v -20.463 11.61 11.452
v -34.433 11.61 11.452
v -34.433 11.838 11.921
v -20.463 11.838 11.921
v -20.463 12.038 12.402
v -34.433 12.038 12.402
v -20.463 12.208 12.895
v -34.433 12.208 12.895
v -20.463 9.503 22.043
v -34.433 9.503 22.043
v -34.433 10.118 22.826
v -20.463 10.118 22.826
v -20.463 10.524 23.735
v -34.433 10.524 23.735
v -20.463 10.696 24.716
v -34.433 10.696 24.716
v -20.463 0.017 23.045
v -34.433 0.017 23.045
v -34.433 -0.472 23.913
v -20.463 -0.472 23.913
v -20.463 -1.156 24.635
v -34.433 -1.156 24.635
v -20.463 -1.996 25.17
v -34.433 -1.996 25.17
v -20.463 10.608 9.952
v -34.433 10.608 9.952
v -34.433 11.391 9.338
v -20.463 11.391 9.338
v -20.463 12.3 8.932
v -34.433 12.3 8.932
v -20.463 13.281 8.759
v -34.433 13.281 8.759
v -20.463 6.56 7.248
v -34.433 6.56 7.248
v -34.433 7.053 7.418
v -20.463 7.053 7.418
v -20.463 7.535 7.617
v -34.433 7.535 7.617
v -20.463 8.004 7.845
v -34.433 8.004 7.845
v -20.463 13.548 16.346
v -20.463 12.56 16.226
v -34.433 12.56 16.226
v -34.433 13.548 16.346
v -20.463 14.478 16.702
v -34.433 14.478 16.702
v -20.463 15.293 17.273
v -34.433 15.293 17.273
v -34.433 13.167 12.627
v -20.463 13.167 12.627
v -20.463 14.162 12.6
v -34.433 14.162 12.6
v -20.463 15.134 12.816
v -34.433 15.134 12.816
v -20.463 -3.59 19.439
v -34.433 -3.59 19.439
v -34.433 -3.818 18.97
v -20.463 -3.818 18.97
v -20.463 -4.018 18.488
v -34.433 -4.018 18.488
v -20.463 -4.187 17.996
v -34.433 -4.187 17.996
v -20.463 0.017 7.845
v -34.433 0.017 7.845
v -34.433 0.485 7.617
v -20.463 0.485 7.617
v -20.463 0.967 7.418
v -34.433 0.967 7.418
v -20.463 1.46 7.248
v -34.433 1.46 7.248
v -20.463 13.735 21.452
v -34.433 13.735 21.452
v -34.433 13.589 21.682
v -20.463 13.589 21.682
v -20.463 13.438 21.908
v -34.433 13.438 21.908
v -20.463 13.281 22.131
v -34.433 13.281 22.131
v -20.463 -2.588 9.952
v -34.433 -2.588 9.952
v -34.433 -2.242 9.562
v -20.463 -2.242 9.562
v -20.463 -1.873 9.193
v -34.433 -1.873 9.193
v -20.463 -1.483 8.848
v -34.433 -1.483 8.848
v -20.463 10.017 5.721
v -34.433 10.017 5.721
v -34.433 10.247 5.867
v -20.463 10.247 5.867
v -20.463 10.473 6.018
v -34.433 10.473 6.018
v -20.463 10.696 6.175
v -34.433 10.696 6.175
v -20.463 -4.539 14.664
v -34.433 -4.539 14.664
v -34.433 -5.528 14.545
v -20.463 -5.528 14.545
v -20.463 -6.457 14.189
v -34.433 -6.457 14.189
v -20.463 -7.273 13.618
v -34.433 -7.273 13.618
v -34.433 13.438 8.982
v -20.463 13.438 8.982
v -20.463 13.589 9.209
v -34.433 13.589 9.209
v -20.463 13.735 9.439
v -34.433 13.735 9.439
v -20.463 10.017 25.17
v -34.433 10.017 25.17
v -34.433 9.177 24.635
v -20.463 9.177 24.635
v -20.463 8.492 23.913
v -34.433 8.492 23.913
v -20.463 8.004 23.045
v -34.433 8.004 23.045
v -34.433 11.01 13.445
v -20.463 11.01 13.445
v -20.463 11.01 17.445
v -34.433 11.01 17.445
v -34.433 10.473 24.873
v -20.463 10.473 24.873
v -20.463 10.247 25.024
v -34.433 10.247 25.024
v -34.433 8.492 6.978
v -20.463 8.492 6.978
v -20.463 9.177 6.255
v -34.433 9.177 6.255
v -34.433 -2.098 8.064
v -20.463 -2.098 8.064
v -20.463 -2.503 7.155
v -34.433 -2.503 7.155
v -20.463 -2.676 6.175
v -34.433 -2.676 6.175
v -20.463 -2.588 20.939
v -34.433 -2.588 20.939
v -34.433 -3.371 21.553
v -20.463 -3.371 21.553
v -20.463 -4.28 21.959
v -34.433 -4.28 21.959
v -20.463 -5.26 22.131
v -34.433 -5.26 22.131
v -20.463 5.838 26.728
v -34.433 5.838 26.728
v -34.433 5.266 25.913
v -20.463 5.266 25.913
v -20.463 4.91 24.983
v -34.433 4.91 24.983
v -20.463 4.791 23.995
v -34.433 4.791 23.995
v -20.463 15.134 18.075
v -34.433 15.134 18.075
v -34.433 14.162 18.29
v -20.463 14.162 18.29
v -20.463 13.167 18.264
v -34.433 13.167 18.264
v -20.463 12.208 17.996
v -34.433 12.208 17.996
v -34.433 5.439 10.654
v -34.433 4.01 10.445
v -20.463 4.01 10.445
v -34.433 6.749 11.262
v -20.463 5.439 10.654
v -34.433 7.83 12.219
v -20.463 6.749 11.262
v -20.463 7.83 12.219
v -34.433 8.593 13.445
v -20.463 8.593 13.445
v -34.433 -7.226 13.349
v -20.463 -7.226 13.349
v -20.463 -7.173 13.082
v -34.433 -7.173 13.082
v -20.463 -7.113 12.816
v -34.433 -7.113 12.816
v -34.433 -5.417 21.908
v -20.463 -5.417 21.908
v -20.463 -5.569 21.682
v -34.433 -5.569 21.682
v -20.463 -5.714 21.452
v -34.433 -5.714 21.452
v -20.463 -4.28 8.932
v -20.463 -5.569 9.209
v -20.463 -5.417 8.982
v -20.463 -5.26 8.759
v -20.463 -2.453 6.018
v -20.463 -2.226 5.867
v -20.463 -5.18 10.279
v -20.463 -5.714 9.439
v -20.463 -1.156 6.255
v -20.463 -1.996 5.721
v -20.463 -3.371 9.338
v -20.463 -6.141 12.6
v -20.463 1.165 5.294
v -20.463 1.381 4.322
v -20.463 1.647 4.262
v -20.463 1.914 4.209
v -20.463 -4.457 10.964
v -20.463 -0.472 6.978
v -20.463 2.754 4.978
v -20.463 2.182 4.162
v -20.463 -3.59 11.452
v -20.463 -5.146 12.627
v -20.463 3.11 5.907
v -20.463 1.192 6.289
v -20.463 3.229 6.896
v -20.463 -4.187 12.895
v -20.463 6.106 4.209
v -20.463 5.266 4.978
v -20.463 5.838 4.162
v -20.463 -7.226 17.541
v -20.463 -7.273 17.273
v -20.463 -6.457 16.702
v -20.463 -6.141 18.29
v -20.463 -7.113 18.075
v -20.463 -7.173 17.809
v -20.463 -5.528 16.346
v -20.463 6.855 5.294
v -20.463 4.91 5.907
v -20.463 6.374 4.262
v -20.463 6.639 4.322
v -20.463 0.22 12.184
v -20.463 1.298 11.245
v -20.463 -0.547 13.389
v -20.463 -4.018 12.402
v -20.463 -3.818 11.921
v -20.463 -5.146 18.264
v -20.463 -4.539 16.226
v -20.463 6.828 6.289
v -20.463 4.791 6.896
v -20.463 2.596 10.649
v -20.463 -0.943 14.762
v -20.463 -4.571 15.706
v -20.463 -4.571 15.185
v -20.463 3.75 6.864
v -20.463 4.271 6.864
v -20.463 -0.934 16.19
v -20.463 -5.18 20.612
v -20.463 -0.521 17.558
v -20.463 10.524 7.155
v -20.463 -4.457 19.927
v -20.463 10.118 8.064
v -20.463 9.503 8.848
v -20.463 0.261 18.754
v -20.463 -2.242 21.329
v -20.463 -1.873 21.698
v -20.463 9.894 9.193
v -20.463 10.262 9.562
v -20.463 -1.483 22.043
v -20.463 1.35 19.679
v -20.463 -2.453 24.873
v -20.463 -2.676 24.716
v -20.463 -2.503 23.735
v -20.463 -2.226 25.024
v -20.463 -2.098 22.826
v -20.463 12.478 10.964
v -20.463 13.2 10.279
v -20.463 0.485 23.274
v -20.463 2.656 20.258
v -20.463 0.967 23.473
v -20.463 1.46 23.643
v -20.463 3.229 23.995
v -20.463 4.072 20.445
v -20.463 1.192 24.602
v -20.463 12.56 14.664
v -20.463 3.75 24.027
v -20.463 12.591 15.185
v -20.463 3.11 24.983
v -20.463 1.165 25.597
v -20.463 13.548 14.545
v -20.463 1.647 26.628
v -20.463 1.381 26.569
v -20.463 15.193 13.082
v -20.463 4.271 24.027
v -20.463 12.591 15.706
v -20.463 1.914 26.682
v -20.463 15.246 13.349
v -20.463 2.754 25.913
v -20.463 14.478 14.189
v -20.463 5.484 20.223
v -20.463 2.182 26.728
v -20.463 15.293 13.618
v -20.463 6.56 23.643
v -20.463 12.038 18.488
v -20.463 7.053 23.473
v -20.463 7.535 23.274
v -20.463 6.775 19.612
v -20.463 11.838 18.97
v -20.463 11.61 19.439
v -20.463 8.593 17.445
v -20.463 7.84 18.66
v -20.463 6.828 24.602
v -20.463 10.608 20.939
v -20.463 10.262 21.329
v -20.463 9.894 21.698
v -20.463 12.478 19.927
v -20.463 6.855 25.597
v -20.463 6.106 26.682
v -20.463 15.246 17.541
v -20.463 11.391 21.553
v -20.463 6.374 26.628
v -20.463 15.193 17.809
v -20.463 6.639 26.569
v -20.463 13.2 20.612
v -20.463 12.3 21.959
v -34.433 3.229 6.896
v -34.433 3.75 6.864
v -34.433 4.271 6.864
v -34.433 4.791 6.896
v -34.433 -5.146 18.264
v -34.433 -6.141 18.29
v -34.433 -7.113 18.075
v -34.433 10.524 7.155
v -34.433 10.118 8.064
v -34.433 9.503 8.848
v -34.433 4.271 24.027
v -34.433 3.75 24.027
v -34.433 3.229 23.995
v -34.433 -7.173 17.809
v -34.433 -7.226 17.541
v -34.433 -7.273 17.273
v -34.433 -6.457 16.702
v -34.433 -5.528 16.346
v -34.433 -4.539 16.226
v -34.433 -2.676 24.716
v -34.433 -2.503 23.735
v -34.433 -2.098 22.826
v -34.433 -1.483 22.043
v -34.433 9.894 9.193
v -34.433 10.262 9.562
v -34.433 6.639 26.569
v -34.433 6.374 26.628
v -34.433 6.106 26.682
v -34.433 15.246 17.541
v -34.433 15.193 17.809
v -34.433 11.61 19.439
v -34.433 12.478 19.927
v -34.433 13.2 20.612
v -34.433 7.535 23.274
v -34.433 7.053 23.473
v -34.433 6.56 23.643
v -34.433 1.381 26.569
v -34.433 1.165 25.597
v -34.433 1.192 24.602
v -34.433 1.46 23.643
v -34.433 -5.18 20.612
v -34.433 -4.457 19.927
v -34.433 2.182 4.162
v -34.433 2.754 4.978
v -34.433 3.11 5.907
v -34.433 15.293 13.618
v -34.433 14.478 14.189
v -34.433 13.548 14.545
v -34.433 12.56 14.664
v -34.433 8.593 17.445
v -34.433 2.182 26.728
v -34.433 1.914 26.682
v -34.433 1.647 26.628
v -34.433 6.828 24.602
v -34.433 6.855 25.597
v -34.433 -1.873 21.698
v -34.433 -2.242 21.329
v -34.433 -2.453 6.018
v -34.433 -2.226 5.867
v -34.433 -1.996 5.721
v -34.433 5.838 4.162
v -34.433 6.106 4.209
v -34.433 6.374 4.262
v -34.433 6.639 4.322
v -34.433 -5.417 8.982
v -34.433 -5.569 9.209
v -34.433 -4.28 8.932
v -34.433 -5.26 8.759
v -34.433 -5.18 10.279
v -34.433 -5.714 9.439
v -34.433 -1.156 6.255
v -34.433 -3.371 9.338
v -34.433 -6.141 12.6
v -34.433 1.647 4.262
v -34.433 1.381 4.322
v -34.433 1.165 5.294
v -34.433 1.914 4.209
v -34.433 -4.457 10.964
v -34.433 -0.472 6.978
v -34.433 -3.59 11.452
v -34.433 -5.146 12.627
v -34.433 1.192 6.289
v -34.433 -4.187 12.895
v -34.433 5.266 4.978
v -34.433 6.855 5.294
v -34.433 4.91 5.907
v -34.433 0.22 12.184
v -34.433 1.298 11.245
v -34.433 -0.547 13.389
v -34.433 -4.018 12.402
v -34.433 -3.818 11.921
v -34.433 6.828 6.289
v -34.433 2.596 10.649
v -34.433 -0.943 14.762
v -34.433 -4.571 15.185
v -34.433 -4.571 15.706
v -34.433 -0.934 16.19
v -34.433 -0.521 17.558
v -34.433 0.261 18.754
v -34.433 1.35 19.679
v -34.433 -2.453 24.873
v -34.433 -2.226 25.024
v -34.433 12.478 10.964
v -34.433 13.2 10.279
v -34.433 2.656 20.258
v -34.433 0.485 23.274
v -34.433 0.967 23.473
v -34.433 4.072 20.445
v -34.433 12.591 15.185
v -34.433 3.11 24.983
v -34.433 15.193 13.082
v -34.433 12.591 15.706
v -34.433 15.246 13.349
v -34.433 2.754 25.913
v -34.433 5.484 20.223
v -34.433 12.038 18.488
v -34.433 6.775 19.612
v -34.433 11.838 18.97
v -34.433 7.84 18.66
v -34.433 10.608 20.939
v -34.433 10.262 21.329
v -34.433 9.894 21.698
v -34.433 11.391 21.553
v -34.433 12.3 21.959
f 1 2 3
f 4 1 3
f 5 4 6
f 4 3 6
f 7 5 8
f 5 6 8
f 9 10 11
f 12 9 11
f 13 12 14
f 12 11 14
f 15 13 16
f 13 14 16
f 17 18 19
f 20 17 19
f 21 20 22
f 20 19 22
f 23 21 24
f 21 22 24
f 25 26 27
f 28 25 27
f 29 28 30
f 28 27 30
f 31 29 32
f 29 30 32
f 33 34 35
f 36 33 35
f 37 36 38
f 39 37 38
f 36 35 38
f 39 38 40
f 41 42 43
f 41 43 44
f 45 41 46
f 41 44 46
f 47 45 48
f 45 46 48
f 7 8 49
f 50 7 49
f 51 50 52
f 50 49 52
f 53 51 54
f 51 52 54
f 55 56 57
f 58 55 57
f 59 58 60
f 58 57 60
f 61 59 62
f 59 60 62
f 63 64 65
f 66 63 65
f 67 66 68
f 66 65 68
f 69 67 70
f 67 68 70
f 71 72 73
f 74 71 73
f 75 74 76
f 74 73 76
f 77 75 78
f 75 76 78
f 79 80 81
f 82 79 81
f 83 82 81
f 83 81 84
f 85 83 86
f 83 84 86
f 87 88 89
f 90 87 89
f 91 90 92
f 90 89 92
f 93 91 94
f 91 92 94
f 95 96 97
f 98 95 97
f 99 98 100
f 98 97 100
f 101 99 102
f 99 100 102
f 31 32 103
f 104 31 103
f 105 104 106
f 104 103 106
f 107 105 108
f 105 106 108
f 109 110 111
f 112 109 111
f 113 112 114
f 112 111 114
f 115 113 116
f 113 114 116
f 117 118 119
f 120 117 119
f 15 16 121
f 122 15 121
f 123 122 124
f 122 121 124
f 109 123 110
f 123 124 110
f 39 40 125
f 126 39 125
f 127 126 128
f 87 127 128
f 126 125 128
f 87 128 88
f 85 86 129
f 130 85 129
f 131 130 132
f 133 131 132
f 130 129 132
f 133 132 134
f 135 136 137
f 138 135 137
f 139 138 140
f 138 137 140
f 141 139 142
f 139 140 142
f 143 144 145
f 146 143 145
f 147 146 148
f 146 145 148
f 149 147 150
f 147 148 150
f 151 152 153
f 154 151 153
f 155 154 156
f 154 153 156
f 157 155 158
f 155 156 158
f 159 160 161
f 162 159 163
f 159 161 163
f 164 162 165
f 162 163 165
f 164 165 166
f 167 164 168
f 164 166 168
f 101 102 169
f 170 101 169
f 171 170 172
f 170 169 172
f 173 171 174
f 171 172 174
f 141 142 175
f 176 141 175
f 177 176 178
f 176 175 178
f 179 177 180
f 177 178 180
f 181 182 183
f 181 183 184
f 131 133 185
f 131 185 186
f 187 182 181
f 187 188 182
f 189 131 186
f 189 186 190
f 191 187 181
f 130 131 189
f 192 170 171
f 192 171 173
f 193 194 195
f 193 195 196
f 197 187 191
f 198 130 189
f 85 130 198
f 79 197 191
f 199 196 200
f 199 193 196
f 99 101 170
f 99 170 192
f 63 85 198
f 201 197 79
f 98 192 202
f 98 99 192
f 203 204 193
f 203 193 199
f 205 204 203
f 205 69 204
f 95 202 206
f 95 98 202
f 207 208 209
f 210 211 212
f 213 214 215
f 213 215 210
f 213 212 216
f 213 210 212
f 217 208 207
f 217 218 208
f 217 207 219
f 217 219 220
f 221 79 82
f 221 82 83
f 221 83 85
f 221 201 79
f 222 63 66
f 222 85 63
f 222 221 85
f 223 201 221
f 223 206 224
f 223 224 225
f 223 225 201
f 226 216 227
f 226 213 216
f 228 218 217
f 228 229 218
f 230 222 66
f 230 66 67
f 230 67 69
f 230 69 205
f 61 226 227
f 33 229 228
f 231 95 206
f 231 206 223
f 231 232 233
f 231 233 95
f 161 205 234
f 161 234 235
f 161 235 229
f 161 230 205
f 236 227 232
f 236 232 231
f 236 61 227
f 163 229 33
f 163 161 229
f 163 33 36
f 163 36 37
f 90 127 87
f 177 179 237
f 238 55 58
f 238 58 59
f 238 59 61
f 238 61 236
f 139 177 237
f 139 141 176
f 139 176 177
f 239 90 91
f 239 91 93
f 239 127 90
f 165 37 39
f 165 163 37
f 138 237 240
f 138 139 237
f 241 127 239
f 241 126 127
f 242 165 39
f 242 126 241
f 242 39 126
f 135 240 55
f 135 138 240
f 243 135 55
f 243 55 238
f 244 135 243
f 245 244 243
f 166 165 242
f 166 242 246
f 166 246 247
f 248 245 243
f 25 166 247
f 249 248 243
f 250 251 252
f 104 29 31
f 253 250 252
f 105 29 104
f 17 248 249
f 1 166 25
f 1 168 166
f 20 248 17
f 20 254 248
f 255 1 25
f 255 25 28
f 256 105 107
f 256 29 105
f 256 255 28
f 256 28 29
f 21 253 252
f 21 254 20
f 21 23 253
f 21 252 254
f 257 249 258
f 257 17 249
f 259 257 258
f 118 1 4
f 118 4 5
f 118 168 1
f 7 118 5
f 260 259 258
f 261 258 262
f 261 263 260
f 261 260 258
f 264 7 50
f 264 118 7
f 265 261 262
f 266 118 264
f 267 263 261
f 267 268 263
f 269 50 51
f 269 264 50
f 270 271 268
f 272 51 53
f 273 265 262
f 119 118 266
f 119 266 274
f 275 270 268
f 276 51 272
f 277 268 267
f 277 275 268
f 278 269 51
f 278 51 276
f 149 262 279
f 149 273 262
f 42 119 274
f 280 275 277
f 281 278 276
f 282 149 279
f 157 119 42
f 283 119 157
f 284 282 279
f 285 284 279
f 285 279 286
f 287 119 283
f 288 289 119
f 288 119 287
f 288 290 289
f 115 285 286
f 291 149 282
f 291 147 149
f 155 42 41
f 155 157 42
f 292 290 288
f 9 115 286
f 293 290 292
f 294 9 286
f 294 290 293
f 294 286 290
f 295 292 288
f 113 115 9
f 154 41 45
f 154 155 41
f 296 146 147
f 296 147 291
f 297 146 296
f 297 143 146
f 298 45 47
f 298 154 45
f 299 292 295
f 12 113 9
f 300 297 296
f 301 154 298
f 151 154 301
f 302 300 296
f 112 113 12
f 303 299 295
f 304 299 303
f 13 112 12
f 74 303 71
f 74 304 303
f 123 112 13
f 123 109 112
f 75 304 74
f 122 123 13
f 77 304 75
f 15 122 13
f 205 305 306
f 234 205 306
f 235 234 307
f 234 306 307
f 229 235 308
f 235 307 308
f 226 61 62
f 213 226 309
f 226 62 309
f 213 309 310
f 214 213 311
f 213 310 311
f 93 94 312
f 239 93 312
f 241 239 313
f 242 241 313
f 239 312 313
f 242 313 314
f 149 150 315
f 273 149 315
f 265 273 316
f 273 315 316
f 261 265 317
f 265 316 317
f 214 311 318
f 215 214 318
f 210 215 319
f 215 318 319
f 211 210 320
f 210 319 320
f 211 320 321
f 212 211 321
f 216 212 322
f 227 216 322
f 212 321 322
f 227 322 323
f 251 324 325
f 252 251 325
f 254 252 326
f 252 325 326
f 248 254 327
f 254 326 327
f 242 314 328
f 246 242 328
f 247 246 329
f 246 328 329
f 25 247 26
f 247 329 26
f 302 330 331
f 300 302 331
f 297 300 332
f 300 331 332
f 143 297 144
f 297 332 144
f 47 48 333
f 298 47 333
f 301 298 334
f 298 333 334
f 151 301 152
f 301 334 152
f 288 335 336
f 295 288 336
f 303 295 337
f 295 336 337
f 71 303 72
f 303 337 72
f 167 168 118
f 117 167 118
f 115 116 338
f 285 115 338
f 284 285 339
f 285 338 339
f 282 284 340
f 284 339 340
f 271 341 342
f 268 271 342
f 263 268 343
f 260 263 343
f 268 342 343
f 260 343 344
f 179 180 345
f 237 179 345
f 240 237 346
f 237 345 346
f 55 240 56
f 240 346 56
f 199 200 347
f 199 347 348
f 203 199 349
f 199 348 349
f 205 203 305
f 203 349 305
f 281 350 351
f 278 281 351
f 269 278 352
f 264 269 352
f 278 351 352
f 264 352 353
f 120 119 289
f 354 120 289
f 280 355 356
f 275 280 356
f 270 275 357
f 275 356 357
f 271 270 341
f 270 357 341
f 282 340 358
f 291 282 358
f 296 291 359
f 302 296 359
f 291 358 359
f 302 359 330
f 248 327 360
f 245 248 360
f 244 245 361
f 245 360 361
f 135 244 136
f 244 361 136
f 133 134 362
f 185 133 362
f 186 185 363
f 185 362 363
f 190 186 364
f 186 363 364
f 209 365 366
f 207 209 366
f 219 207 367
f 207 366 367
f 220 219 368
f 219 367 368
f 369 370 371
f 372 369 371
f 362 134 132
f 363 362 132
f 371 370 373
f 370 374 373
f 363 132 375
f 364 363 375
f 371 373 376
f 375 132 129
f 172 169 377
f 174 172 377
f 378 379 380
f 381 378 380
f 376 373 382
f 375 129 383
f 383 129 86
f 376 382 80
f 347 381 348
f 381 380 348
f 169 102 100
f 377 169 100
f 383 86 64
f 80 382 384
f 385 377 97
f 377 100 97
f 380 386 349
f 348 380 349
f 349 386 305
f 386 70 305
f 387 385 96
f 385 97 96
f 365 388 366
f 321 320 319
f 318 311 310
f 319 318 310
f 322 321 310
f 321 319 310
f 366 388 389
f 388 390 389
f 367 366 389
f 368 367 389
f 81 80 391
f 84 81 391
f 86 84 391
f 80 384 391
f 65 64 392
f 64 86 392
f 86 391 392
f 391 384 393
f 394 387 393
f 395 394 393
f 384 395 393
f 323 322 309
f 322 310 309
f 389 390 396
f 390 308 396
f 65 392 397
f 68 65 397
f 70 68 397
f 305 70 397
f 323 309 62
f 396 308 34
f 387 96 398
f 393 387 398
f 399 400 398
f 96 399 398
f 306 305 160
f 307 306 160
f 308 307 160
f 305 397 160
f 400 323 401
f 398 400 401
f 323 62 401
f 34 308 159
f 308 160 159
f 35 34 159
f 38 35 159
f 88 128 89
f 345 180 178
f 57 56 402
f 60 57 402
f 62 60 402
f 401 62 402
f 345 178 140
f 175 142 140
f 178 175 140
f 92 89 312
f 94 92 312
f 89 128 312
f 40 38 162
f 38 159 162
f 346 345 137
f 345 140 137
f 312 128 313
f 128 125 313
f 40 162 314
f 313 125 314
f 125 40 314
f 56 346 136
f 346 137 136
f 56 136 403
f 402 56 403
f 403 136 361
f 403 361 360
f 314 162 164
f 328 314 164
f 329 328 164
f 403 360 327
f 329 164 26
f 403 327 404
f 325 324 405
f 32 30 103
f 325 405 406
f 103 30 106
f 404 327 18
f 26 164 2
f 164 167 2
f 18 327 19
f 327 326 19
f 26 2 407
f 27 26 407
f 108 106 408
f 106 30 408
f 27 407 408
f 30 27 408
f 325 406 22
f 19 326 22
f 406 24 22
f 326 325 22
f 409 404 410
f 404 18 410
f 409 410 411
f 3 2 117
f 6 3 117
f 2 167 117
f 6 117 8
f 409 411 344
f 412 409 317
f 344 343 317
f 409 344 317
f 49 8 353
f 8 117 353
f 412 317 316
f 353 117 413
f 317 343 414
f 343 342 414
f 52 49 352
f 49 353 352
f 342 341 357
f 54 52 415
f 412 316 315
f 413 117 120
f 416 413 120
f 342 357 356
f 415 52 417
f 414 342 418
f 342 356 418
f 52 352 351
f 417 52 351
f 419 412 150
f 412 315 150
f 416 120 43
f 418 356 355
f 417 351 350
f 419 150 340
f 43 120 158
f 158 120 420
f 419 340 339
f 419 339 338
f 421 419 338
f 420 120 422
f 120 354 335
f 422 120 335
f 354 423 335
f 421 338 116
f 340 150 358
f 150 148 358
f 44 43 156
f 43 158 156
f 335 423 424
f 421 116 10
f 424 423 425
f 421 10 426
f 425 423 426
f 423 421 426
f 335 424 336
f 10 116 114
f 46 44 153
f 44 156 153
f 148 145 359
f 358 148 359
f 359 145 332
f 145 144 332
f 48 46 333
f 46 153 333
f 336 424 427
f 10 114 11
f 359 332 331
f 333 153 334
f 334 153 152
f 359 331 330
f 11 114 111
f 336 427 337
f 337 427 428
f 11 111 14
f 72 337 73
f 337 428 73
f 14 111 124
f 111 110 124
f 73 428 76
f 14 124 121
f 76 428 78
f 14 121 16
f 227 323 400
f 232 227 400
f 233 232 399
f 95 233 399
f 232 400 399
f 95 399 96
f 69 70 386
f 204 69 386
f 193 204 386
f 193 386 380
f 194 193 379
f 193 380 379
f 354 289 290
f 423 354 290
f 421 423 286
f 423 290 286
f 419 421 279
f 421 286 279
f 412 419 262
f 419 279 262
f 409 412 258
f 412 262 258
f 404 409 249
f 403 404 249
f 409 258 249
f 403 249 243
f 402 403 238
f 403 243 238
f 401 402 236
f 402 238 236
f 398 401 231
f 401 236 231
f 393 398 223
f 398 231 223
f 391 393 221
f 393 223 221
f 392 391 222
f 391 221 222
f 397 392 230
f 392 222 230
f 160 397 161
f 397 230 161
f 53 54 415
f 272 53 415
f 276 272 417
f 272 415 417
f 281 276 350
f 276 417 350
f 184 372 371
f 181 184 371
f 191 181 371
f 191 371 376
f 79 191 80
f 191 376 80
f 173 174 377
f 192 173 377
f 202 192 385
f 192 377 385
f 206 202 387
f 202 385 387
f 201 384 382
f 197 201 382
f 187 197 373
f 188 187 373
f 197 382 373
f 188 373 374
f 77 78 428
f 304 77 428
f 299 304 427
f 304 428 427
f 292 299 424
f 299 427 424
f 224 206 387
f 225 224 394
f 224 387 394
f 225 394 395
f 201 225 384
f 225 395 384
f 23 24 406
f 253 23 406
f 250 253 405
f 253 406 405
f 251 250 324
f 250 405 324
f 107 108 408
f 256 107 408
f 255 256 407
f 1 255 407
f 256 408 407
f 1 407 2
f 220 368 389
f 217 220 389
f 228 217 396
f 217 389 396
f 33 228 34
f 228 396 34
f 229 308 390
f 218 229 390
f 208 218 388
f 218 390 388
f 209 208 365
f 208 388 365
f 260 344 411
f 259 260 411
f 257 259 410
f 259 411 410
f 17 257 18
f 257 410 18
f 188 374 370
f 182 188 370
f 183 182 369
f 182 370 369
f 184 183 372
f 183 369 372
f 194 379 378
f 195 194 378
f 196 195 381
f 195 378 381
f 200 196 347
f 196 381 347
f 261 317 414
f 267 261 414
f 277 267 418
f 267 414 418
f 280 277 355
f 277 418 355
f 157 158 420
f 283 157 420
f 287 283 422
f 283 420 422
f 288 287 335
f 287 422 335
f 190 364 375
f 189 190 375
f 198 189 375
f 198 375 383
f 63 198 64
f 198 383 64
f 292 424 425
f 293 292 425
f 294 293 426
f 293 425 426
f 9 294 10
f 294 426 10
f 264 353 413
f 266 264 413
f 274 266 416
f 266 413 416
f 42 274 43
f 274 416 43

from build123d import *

# Parameters (mm, degrees)
SPUR_START             = -34.432979129
SPUR_GEAR_AI_OUTLINE_R = 4.7625
SPUR_GEAR_AI_DEPTH     = 13.97
CUT_EXTRUDE1_DEPTH     = 34.814807958


# Read off the part's stored shape, not the designer's step: spur gear_ai
with BuildPart() as part:
    # spur gear_ai outline → spur gear_ai (new body)
    with BuildSketch(Plane.YZ.offset(SPUR_START)):
        with BuildLine():
            ThreePointArc((13.280785394, 8.759491053), (13.513878524, 9.095188342), (13.734821499, 9.439004105))
            ThreePointArc((13.734821499, 9.439004105), (12.859979854, 10.643431253), (11.610114863, 11.452028906))
            ThreePointArc((11.610114863, 11.452028906), (11.941871418, 12.159942302), (12.207854471, 12.895099975))
            ThreePointArc((12.207854471, 12.895099975), (13.663407365, 12.583076847), (15.133672429, 12.816128991))
            ThreePointArc((15.133672429, 12.816128991), (15.220556611, 13.215473725), (15.293108707, 13.617669288))
            ThreePointArc((15.293108707, 13.617669288), (14.023946102, 14.395627475), (12.559784493, 14.664371671))
            ThreePointArc((12.559784493, 14.664371671), (12.595380856, 15.445356105), (12.559784493, 16.22634054))
            ThreePointArc((12.559784493, 16.22634054), (14.023946102, 16.495084736), (15.293108707, 17.273042923))
            ThreePointArc((15.293108707, 17.273042923), (15.220556611, 17.675238486), (15.133672429, 18.07458322))
            ThreePointArc((15.133672429, 18.07458322), (13.663407365, 18.307635364), (12.207854471, 17.995612236))
            ThreePointArc((12.207854471, 17.995612236), (11.941871418, 18.730769909), (11.610114863, 19.438683305))
            ThreePointArc((11.610114863, 19.438683305), (12.859979854, 20.247280957), (13.734821499, 21.451708106))
            ThreePointArc((13.734821499, 21.451708106), (13.513878524, 21.795523869), (13.280785394, 22.131221158))
            ThreePointArc((13.280785394, 22.131221158), (11.8332524, 21.783887183), (10.607902954, 20.938599424))
            ThreePointArc((10.607902954, 20.938599424), (10.080833993, 21.516009243), (9.503424174, 22.043078204))
            ThreePointArc((9.503424174, 22.043078204), (10.348711933, 23.26842765), (10.696045908, 24.715960644))
            ThreePointArc((10.696045908, 24.715960644), (10.360348619, 24.949053774), (10.016532856, 25.169996749))
            ThreePointArc((10.016532856, 25.169996749), (8.812105708, 24.295155104), (8.003508055, 23.045290113))
            ThreePointArc((8.003508055, 23.045290113), (7.295594659, 23.377046668), (6.560436986, 23.643029721))
            ThreePointArc((6.560436986, 23.643029721), (6.872460114, 25.098582615), (6.63940797, 26.568847679))
            ThreePointArc((6.63940797, 26.568847679), (6.240063236, 26.65573186), (5.837867673, 26.728283957))
            ThreePointArc((5.837867673, 26.728283957), (5.059909486, 25.459121352), (4.79116529, 23.994959743))
            ThreePointArc((4.79116529, 23.994959743), (4.010180856, 24.030556105), (3.229196421, 23.994959743))
            ThreePointArc((3.229196421, 23.994959743), (2.960452225, 25.459121352), (2.182494038, 26.728283957))
            ThreePointArc((2.182494038, 26.728283957), (1.780298475, 26.65573186), (1.380953741, 26.568847679))
            ThreePointArc((1.380953741, 26.568847679), (1.147901597, 25.098582615), (1.459924725, 23.643029721))
            ThreePointArc((1.459924725, 23.643029721), (0.724767052, 23.377046668), (0.016853656, 23.045290113))
            ThreePointArc((0.016853656, 23.045290113), (-0.791743997, 24.295155104), (-1.996171145, 25.169996749))
            ThreePointArc((-1.996171145, 25.169996749), (-2.339986908, 24.949053774), (-2.675684197, 24.715960644))
            ThreePointArc((-2.675684197, 24.715960644), (-2.328350222, 23.26842765), (-1.483062463, 22.043078204))
            ThreePointArc((-1.483062463, 22.043078204), (-2.060472282, 21.516009243), (-2.587541243, 20.938599424))
            ThreePointArc((-2.587541243, 20.938599424), (-3.812890689, 21.783887183), (-5.260423683, 22.131221158))
            ThreePointArc((-5.260423683, 22.131221158), (-5.493516813, 21.795523869), (-5.714459788, 21.451708106))
            ThreePointArc((-5.714459788, 21.451708106), (-4.839618143, 20.247280957), (-3.589753152, 19.438683305))
            ThreePointArc((-3.589753152, 19.438683305), (-3.921509707, 18.730769909), (-4.18749276, 17.995612236))
            ThreePointArc((-4.18749276, 17.995612236), (-5.643045654, 18.307635364), (-7.113310718, 18.07458322))
            ThreePointArc((-7.113310718, 18.07458322), (-7.200194899, 17.675238486), (-7.272746996, 17.273042923))
            ThreePointArc((-7.272746996, 17.273042923), (-6.003584391, 16.495084736), (-4.539422782, 16.22634054))
            ThreePointArc((-4.539422782, 16.22634054), (-4.575019144, 15.445356106), (-4.539422782, 14.664371671))
            ThreePointArc((-4.539422782, 14.664371671), (-6.003584391, 14.395627475), (-7.272746996, 13.617669288))
            ThreePointArc((-7.272746996, 13.617669288), (-7.200194899, 13.215473725), (-7.113310718, 12.816128991))
            ThreePointArc((-7.113310718, 12.816128991), (-5.643045654, 12.583076847), (-4.18749276, 12.895099975))
            ThreePointArc((-4.18749276, 12.895099975), (-3.921509707, 12.159942302), (-3.589753152, 11.452028906))
            ThreePointArc((-3.589753152, 11.452028906), (-4.839618143, 10.643431253), (-5.714459788, 9.439004105))
            ThreePointArc((-5.714459788, 9.439004105), (-5.493516813, 9.095188342), (-5.260423683, 8.759491053))
            ThreePointArc((-5.260423683, 8.759491053), (-3.812890689, 9.106825028), (-2.587541243, 9.952112787))
            ThreePointArc((-2.587541243, 9.952112787), (-2.060472282, 9.374702968), (-1.483062463, 8.847634007))
            ThreePointArc((-1.483062463, 8.847634007), (-2.328350222, 7.622284561), (-2.675684197, 6.174751567))
            ThreePointArc((-2.675684197, 6.174751567), (-2.339986908, 5.941658437), (-1.996171145, 5.720715462))
            ThreePointArc((-1.996171145, 5.720715462), (-0.791743997, 6.595557107), (0.016853656, 7.845422098))
            ThreePointArc((0.016853656, 7.845422098), (0.724767052, 7.513665543), (1.459924725, 7.24768249))
            ThreePointArc((1.459924725, 7.24768249), (1.147901597, 5.792129596), (1.380953741, 4.321864532))
            ThreePointArc((1.380953741, 4.321864532), (1.780298475, 4.23498035), (2.182494038, 4.162428254))
            ThreePointArc((2.182494038, 4.162428254), (2.960452225, 5.431590859), (3.229196421, 6.895752468))
            ThreePointArc((3.229196421, 6.895752468), (4.010180855, 6.860156105), (4.79116529, 6.895752468))
            ThreePointArc((4.79116529, 6.895752468), (5.059909486, 5.431590859), (5.837867673, 4.162428254))
            ThreePointArc((5.837867673, 4.162428254), (6.240063236, 4.23498035), (6.63940797, 4.321864532))
            ThreePointArc((6.63940797, 4.321864532), (6.872460114, 5.792129596), (6.560436986, 7.24768249))
            ThreePointArc((6.560436986, 7.24768249), (7.295594659, 7.513665543), (8.003508055, 7.845422098))
            ThreePointArc((8.003508055, 7.845422098), (8.812105708, 6.595557107), (10.016532856, 5.720715462))
            ThreePointArc((10.016532856, 5.720715462), (10.360348619, 5.941658437), (10.696045908, 6.174751567))
            ThreePointArc((10.696045908, 6.174751567), (10.348711933, 7.622284561), (9.503424174, 8.847634007))
            ThreePointArc((9.503424174, 8.847634007), (10.080833993, 9.374702968), (10.607902954, 9.952112787))
            ThreePointArc((10.607902954, 9.952112787), (11.8332524, 9.106825028), (13.280785394, 8.759491053))
        make_face()
        with Locations((4.010180856, 15.445356105)):
            Circle(SPUR_GEAR_AI_OUTLINE_R, mode=Mode.SUBTRACT)
    extrude(amount=SPUR_GEAR_AI_DEPTH)

    # Sketch1 → Cut-Extrude1 (cut, through all)
    with BuildSketch(Plane(origin=(-20.462979129, 0, 0), x_dir=(0, 0, -1), z_dir=(1, 0, 0))):
        with BuildLine():
            Line((-13.445356105, 8.59275655), (-13.445356105, 11.010180856))
            Line((-13.445356105, 11.010180856), (-17.445356105, 11.010180856))
            Line((-17.445356105, 11.010180856), (-17.445356105, 8.59275655))
            ThreePointArc((-17.445356105, 8.59275655), (-15.445356105, 9.010180856), (-13.445356105, 8.59275655))
        make_face()
        with BuildLine():
            ThreePointArc((-10.445356105, 4.010180856), (-11.262055973, 6.748793643), (-13.445356105, 8.59275655))
            Line((-13.445356105, 8.59275655), (-13.445356105, 7.010180856))
            Line((-13.445356105, 7.010180856), (-17.445356105, 7.010180856))
            Line((-17.445356105, 7.010180856), (-17.445356105, 8.59275655))
            ThreePointArc((-17.445356105, 8.59275655), (-18.183968893, -0.173119277), (-10.445356105, 4.010180856))
        make_face()
        with BuildLine():
            Line((-13.445356105, 7.010180856), (-13.445356105, 8.59275655))
            ThreePointArc((-13.445356105, 8.59275655), (-15.445356105, 9.010180856), (-17.445356105, 8.59275655))
            Line((-17.445356105, 8.59275655), (-17.445356105, 7.010180856))
            Line((-17.445356105, 7.010180856), (-13.445356105, 7.010180856))
        make_face()
    extrude(amount=-CUT_EXTRUDE1_DEPTH, mode=Mode.SUBTRACT)


solid = part.part
